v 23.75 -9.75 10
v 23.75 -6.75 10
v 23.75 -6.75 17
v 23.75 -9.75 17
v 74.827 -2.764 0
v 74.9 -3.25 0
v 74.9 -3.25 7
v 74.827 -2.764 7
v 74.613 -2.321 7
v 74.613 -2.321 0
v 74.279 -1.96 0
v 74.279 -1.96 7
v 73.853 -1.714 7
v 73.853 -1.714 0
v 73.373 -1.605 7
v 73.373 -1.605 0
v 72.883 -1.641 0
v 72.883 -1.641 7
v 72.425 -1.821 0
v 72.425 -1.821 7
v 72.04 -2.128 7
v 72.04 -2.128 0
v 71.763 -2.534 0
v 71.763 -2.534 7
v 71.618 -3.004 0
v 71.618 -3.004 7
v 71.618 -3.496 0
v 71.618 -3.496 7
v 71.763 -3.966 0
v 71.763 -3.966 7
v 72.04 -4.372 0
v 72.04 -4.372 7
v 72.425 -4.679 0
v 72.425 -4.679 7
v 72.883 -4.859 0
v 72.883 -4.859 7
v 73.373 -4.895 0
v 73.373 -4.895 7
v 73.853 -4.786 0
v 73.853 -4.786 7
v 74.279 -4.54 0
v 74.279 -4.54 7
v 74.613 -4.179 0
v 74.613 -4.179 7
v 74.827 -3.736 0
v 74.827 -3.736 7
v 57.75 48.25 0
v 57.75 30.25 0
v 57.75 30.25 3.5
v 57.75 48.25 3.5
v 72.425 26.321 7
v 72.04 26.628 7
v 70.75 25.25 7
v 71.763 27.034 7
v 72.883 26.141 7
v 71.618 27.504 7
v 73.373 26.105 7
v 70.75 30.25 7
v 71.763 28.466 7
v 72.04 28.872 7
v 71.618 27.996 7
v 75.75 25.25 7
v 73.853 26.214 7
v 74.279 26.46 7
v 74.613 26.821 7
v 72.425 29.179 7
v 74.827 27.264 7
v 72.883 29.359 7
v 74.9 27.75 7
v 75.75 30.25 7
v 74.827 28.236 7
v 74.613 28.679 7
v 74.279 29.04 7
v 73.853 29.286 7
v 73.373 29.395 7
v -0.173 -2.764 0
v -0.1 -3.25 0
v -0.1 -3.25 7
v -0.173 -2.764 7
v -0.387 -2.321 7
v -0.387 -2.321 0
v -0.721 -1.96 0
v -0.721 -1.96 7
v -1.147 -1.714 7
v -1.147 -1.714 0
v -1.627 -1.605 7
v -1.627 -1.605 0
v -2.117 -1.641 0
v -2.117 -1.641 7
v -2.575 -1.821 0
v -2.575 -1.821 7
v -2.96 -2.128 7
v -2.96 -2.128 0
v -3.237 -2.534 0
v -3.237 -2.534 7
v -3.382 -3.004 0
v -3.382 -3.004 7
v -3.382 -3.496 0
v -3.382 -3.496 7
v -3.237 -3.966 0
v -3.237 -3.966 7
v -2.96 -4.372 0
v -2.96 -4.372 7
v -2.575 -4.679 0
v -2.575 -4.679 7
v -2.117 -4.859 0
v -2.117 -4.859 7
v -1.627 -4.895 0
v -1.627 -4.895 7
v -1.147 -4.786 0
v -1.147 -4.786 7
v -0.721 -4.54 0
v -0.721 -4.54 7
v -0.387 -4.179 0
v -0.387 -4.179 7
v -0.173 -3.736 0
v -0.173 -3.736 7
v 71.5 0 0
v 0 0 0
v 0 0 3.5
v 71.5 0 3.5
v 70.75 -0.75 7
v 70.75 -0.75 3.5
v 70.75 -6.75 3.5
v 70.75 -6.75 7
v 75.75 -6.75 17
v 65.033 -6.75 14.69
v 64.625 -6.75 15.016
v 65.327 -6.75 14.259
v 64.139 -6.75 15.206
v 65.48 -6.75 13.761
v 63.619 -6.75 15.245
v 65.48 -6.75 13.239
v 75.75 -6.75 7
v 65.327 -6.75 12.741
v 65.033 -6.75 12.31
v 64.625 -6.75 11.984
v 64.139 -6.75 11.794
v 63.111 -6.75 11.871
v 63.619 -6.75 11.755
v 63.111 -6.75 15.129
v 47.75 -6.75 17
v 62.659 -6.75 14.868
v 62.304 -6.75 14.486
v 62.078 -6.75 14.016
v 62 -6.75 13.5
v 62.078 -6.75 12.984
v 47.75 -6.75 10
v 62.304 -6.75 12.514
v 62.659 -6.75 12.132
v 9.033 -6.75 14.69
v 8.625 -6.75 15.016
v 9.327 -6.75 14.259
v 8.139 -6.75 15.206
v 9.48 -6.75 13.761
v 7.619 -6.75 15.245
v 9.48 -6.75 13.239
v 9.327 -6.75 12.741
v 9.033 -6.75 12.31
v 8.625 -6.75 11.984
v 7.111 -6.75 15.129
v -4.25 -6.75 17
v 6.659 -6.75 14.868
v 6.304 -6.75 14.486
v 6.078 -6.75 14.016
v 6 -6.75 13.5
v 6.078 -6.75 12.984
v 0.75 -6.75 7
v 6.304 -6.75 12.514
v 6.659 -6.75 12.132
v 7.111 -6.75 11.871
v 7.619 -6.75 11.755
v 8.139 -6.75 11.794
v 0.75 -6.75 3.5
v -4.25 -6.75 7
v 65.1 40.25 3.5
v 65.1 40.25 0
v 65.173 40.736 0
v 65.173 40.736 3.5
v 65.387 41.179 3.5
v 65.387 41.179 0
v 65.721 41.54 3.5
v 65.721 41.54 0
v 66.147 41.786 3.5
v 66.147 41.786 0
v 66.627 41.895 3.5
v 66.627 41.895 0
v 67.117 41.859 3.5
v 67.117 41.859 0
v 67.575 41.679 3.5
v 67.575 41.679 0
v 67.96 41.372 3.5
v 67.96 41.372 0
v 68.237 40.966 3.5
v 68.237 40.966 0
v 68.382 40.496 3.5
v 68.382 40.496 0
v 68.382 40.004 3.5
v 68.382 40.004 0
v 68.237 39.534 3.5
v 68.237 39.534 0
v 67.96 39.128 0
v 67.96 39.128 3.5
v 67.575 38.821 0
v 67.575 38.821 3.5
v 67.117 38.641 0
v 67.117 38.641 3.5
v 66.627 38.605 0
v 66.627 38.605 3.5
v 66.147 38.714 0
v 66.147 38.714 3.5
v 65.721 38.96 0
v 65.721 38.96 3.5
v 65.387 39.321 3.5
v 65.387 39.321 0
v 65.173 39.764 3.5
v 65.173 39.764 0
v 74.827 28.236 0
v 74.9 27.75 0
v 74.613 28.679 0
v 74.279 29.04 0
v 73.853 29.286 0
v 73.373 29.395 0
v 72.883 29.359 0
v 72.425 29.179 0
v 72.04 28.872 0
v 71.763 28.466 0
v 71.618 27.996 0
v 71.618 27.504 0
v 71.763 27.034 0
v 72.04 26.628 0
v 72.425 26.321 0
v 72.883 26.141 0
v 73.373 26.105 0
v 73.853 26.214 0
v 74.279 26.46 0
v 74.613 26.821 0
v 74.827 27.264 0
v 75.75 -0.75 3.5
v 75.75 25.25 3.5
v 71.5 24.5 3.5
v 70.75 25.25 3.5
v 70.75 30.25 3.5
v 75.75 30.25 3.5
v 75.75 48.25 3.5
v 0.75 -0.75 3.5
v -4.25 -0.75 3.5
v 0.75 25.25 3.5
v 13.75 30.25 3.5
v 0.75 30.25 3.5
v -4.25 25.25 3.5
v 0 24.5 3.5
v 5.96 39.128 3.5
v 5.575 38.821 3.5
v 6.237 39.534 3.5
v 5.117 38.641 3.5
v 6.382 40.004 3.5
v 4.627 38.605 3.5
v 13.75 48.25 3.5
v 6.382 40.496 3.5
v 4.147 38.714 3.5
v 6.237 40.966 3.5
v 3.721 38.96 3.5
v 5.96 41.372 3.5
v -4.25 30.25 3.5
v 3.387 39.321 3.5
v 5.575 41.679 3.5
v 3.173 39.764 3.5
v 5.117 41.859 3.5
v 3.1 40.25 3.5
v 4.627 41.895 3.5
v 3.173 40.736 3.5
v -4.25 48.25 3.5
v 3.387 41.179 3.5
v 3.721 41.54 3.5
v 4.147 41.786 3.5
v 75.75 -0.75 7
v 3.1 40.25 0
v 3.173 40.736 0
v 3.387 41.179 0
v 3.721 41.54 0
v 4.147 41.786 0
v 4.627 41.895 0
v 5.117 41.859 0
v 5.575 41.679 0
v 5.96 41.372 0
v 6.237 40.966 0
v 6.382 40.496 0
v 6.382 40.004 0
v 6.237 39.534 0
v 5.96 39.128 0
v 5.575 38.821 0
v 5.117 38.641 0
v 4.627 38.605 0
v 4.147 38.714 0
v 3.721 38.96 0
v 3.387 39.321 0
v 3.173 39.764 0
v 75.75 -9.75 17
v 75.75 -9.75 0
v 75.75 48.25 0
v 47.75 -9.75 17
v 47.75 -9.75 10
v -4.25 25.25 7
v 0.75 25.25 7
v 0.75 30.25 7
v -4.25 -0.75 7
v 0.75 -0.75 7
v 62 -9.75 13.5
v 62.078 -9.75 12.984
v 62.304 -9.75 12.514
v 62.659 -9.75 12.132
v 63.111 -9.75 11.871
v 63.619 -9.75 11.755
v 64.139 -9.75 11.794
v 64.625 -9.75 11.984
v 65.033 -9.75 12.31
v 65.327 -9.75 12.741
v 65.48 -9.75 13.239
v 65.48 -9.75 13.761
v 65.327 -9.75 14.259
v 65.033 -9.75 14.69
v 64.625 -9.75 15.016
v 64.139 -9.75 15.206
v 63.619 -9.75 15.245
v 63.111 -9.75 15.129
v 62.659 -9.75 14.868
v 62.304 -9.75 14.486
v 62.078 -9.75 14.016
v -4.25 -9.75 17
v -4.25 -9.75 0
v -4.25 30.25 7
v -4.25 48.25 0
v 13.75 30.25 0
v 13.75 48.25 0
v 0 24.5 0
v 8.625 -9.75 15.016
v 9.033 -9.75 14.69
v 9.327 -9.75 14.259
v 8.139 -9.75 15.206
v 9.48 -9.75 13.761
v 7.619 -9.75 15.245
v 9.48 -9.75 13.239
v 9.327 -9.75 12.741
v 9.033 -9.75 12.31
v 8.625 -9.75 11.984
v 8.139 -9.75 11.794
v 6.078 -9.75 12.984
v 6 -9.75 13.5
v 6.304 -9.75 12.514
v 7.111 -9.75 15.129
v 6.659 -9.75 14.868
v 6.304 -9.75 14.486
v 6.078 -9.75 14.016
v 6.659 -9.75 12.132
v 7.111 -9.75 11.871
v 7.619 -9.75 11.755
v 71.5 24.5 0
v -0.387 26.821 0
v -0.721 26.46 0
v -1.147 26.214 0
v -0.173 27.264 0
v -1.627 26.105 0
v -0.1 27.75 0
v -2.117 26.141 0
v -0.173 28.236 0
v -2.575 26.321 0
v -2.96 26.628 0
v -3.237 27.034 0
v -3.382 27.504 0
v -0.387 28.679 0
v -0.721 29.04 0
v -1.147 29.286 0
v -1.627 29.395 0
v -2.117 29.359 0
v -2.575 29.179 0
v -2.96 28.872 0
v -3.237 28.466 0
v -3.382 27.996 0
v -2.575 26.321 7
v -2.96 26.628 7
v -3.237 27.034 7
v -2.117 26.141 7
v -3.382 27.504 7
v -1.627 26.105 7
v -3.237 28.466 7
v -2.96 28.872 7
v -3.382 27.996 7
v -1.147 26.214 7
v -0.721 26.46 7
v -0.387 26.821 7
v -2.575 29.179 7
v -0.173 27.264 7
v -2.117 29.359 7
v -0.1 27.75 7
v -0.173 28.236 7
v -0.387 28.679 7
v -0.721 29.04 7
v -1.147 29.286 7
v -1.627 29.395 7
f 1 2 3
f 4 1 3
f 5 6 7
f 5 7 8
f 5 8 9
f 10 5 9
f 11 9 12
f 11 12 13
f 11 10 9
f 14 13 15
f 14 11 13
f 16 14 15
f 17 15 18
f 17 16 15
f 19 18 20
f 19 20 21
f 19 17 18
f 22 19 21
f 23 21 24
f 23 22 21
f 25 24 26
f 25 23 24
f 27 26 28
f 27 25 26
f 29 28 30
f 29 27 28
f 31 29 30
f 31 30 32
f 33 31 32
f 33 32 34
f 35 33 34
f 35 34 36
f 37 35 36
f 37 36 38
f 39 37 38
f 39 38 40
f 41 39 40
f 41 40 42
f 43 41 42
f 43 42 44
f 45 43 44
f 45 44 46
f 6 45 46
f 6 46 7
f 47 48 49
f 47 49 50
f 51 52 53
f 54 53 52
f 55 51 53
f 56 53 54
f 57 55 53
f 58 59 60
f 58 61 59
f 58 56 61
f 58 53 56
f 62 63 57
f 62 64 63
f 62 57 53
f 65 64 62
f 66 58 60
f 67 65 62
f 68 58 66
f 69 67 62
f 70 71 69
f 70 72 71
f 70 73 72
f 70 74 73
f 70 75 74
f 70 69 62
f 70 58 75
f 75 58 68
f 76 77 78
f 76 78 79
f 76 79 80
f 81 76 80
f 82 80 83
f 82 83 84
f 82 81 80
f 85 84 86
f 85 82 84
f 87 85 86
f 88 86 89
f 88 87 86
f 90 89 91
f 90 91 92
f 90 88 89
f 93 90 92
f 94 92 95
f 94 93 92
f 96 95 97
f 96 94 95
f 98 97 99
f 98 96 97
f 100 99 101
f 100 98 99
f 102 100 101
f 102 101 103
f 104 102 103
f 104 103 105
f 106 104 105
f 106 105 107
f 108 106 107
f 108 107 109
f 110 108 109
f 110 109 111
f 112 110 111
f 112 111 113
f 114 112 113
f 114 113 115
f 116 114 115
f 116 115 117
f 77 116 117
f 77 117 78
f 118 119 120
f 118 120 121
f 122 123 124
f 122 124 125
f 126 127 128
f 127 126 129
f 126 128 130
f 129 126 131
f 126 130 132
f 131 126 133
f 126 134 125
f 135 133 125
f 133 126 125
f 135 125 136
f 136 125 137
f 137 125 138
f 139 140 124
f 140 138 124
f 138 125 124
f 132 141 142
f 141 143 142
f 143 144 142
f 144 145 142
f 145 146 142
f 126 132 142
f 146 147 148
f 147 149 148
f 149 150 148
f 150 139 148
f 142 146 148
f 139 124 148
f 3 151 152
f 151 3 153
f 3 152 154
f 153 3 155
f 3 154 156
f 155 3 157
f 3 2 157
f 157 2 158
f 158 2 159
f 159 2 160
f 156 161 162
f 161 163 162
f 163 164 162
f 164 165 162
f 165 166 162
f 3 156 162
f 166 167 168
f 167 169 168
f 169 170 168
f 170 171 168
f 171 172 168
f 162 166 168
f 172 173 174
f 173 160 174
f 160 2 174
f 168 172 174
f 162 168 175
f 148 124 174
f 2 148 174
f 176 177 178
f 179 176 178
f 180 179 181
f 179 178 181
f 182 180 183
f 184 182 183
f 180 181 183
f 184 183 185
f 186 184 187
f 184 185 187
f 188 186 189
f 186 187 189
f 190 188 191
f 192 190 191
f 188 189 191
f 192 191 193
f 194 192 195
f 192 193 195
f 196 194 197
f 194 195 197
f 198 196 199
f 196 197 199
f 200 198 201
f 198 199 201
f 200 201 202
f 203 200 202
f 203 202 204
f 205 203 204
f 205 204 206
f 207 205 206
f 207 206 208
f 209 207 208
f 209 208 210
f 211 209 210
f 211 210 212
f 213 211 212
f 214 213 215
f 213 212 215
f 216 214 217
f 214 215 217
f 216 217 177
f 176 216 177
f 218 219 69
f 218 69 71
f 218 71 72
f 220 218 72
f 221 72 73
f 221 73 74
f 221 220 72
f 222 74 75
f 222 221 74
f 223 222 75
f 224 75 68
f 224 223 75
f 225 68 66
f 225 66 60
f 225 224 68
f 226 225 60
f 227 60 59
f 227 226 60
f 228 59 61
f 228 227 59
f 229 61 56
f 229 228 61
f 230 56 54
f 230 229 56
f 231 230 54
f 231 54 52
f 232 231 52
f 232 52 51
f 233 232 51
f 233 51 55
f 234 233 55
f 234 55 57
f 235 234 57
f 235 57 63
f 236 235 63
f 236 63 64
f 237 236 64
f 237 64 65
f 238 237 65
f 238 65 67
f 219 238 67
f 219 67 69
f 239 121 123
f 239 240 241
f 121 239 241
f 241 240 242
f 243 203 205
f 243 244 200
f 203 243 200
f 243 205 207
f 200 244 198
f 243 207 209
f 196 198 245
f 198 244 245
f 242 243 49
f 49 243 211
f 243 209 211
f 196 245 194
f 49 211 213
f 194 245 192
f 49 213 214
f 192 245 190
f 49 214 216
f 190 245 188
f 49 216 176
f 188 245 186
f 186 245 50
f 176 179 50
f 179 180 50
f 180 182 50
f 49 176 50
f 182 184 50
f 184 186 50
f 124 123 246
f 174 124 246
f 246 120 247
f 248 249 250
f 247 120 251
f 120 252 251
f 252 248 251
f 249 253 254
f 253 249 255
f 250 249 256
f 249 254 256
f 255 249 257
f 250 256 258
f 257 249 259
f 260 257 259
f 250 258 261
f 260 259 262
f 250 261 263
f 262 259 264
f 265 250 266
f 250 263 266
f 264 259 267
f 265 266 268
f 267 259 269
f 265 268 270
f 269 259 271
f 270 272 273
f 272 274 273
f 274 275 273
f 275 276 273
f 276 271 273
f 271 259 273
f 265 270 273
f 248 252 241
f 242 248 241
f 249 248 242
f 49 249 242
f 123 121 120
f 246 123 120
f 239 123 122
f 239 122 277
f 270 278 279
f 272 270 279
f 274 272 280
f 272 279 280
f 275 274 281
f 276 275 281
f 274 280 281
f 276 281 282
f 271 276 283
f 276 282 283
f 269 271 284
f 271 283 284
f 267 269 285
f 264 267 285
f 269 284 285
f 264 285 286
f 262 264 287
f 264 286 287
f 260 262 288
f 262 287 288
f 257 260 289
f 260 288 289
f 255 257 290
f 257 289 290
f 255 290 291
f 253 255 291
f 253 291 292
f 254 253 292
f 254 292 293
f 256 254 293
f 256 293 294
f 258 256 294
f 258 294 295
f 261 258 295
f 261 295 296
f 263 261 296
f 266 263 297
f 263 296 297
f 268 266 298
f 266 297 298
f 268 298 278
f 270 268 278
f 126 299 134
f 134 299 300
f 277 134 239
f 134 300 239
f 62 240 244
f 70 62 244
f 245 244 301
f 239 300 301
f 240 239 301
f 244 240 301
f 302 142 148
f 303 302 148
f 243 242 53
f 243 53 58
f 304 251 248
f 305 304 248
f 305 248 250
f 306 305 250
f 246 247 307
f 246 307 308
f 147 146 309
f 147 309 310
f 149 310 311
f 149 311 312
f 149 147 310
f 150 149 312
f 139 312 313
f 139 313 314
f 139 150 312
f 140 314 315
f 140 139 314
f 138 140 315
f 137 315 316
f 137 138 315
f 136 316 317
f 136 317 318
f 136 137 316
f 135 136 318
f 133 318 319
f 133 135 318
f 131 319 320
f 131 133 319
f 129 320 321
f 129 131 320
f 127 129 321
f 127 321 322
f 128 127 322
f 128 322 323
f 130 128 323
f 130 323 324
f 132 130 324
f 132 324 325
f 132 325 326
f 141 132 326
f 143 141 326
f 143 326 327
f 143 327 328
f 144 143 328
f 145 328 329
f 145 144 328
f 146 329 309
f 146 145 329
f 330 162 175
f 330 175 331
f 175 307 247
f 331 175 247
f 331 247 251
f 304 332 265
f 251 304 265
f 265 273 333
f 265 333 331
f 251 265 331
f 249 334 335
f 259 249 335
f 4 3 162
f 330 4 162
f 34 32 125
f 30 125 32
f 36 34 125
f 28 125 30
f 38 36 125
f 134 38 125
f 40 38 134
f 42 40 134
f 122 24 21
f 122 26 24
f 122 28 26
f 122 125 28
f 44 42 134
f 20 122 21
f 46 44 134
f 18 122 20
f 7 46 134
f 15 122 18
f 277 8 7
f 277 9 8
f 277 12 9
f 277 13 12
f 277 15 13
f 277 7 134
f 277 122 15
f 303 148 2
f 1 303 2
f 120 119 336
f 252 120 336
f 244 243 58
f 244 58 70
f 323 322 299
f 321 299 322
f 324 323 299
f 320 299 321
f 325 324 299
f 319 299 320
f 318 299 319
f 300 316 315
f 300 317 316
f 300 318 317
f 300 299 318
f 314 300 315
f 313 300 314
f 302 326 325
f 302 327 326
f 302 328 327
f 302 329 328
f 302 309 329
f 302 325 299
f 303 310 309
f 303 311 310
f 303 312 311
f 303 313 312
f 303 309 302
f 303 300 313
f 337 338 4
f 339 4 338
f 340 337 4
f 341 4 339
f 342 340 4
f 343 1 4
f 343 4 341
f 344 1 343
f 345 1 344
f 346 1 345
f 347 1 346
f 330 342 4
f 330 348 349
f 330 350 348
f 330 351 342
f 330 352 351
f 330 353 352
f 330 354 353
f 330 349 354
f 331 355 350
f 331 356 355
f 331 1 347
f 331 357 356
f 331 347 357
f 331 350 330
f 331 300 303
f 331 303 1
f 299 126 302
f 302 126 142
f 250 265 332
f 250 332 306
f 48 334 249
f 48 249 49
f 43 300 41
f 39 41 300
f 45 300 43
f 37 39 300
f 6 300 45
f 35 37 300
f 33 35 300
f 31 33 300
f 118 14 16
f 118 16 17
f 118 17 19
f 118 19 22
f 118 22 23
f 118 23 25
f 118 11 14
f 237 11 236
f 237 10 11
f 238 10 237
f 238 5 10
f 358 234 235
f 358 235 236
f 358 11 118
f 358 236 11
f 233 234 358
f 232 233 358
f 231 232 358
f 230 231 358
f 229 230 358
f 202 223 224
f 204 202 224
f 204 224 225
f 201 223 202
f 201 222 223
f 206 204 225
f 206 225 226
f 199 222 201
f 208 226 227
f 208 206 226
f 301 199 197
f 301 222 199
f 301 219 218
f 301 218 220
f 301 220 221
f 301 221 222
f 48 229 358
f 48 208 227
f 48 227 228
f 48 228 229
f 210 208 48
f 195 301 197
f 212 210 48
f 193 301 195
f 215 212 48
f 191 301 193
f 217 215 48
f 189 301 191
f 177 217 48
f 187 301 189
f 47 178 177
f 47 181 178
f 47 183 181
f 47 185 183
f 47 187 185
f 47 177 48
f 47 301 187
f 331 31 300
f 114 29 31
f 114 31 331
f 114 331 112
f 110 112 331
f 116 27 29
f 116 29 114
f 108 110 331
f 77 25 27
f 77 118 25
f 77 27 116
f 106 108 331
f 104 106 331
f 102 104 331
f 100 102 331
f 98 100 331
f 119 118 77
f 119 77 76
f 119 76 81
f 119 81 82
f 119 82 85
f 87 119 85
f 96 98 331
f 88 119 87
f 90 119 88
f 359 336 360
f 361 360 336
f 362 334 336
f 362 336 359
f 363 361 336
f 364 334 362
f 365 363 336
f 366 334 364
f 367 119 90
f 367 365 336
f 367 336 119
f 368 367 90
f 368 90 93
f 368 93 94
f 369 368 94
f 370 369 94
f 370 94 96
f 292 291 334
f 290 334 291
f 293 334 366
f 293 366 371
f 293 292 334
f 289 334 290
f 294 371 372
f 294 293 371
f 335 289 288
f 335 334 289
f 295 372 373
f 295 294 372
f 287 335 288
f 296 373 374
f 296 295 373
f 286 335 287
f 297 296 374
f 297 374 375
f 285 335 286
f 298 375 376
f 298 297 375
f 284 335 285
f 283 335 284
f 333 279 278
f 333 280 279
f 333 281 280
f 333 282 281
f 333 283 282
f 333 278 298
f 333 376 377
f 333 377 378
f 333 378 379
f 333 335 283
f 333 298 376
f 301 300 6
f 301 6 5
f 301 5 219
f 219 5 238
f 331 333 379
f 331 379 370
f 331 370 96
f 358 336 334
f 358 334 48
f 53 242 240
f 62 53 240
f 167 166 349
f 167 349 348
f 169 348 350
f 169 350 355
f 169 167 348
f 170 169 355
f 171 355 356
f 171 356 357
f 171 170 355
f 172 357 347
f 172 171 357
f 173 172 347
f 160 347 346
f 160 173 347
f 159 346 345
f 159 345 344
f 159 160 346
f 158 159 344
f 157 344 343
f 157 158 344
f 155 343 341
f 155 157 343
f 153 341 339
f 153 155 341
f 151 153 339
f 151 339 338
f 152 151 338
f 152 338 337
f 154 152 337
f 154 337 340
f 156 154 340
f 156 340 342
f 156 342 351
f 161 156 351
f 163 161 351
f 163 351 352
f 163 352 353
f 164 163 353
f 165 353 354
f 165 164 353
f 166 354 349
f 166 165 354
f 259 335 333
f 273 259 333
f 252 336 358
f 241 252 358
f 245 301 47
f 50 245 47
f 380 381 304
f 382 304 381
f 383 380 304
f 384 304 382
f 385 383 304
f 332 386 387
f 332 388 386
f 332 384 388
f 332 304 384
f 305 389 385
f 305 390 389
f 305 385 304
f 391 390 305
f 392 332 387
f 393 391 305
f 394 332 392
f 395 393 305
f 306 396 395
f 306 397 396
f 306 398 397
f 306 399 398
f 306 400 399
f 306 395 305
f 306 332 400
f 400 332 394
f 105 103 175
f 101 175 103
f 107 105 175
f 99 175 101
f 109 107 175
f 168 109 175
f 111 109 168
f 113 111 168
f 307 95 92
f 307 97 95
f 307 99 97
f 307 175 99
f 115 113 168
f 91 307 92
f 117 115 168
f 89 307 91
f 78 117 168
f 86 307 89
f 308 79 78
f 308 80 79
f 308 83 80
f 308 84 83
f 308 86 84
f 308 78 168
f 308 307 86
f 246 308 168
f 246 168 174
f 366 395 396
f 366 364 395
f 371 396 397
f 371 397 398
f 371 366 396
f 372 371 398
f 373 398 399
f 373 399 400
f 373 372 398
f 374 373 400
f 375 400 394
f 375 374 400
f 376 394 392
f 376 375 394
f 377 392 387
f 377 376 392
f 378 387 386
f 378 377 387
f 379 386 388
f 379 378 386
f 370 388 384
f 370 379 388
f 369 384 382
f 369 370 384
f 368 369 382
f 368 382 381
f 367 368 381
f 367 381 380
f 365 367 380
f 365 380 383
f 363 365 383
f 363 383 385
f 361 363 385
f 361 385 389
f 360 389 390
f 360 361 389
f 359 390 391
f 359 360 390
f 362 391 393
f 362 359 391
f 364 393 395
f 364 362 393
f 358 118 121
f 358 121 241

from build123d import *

# Parameters (mm, degrees)
SKETCH1_W           = 80
SKETCH1_H           = 36
SKETCH1_R           = 1.65
SKETCH1_W_2         = 71.5
SKETCH1_H_2         = 24.5
BOSS_EXTRUDE1_DEPTH = 3.5
SKETCH2_W           = 5
SKETCH2_H           = 5
SKETCH2_R           = 1.65
BOSS_EXTRUDE2_DEPTH = 3.5
BOSS_EXTRUDE4_DEPTH = 1
BOSS_EXTRUDE5_START = 1
SKETCH3_R           = 1.75
BOSS_EXTRUDE5_DEPTH = 3
SKETCH7_W           = 18
SKETCH7_H           = 18
SKETCH7_R           = 1.65
BOSS_EXTRUDE6_DEPTH = 3.5


with BuildPart() as part:
    # Sketch1 → Boss-Extrude1 (new body)
    with BuildSketch(Plane.XY):
        with Locations((35.75, 12.25)):
            Rectangle(SKETCH1_W, SKETCH1_H)
        with Locations((-1.75, 27.75)):
            Circle(SKETCH1_R, mode=Mode.SUBTRACT)
        with Locations((73.25, 27.75)):
            Circle(SKETCH1_R, mode=Mode.SUBTRACT)
        with Locations((73.25, -3.25)):
            Circle(SKETCH1_R, mode=Mode.SUBTRACT)
        with Locations((-1.75, -3.25)):
            Circle(SKETCH1_R, mode=Mode.SUBTRACT)
        with Locations((35.75, 12.25)):
            Rectangle(SKETCH1_W_2, SKETCH1_H_2, mode=Mode.SUBTRACT)
    extrude(amount=BOSS_EXTRUDE1_DEPTH)

    # Sketch2 → Boss-Extrude2 (add)
    with BuildSketch(Plane.XY.offset(3.5)):
        with Locations((-1.75, 27.75)):
            Rectangle(SKETCH2_W, SKETCH2_H)
        with Locations((-1.75, 27.75)):
            Circle(SKETCH2_R, mode=Mode.SUBTRACT)
        with Locations((73.25, 27.75)):
            Rectangle(SKETCH2_W, SKETCH2_H)
        with Locations((73.25, 27.75)):
            Circle(SKETCH2_R, mode=Mode.SUBTRACT)
        with Locations((-1.75, -3.25)):
            Rectangle(SKETCH2_W, SKETCH2_H)
        with Locations((-1.75, -3.25)):
            Circle(SKETCH2_R, mode=Mode.SUBTRACT)
        with Locations((73.25, -3.25)):
            Rectangle(SKETCH2_W, SKETCH2_H)
        with Locations((73.25, -3.25)):
            Circle(SKETCH2_R, mode=Mode.SUBTRACT)
    extrude(amount=BOSS_EXTRUDE2_DEPTH)

    # Sketch6 → Boss-Extrude4 (add)
    with BuildSketch(Plane.XZ.offset(5.75)):
        Polygon((-4.25, 0), (-4.25, 7), (0.75, 7), (0.75, 3.5), (70.75, 3.5), (70.75, 7), (75.75, 7), (75.75, 0), align=None)
    extrude(amount=BOSS_EXTRUDE4_DEPTH)

    # Sketch3 → Boss-Extrude5 (add)
    with BuildSketch(Plane(origin=(0, -5.75, 0), x_dir=(-1, 0, 0), z_dir=(0, -1, 0)).offset(BOSS_EXTRUDE5_START)):
        Polygon((-47.75, -17), (-47.75, -10), (-23.75, -10), (-23.75, -17), (4.25, -17), (4.25, 0), (-75.75, 0), (-75.75, -17), align=None)
        with Locations((-7.75, -13.5)):
            Circle(SKETCH3_R, mode=Mode.SUBTRACT)
        with Locations((-63.75, -13.5)):
            Circle(SKETCH3_R, mode=Mode.SUBTRACT)
    extrude(amount=BOSS_EXTRUDE5_DEPTH)

    # Sketch7 → Boss-Extrude6 (add)
    with BuildSketch(Plane(origin=(0, 0, 0), x_dir=(-1, 0, 0), z_dir=(0, 0, -1))):
        with Locations((-66.75, 39.25)):
            Rectangle(SKETCH7_W, SKETCH7_H)
        with Locations((-66.75, 40.25)):
            Circle(SKETCH7_R, mode=Mode.SUBTRACT)
        with Locations((-4.75, 39.25)):
            Rectangle(SKETCH7_W, SKETCH7_H)
        with Locations((-4.75, 40.25)):
            Circle(SKETCH7_R, mode=Mode.SUBTRACT)
    extrude(amount=-BOSS_EXTRUDE6_DEPTH)


solid = part.part
